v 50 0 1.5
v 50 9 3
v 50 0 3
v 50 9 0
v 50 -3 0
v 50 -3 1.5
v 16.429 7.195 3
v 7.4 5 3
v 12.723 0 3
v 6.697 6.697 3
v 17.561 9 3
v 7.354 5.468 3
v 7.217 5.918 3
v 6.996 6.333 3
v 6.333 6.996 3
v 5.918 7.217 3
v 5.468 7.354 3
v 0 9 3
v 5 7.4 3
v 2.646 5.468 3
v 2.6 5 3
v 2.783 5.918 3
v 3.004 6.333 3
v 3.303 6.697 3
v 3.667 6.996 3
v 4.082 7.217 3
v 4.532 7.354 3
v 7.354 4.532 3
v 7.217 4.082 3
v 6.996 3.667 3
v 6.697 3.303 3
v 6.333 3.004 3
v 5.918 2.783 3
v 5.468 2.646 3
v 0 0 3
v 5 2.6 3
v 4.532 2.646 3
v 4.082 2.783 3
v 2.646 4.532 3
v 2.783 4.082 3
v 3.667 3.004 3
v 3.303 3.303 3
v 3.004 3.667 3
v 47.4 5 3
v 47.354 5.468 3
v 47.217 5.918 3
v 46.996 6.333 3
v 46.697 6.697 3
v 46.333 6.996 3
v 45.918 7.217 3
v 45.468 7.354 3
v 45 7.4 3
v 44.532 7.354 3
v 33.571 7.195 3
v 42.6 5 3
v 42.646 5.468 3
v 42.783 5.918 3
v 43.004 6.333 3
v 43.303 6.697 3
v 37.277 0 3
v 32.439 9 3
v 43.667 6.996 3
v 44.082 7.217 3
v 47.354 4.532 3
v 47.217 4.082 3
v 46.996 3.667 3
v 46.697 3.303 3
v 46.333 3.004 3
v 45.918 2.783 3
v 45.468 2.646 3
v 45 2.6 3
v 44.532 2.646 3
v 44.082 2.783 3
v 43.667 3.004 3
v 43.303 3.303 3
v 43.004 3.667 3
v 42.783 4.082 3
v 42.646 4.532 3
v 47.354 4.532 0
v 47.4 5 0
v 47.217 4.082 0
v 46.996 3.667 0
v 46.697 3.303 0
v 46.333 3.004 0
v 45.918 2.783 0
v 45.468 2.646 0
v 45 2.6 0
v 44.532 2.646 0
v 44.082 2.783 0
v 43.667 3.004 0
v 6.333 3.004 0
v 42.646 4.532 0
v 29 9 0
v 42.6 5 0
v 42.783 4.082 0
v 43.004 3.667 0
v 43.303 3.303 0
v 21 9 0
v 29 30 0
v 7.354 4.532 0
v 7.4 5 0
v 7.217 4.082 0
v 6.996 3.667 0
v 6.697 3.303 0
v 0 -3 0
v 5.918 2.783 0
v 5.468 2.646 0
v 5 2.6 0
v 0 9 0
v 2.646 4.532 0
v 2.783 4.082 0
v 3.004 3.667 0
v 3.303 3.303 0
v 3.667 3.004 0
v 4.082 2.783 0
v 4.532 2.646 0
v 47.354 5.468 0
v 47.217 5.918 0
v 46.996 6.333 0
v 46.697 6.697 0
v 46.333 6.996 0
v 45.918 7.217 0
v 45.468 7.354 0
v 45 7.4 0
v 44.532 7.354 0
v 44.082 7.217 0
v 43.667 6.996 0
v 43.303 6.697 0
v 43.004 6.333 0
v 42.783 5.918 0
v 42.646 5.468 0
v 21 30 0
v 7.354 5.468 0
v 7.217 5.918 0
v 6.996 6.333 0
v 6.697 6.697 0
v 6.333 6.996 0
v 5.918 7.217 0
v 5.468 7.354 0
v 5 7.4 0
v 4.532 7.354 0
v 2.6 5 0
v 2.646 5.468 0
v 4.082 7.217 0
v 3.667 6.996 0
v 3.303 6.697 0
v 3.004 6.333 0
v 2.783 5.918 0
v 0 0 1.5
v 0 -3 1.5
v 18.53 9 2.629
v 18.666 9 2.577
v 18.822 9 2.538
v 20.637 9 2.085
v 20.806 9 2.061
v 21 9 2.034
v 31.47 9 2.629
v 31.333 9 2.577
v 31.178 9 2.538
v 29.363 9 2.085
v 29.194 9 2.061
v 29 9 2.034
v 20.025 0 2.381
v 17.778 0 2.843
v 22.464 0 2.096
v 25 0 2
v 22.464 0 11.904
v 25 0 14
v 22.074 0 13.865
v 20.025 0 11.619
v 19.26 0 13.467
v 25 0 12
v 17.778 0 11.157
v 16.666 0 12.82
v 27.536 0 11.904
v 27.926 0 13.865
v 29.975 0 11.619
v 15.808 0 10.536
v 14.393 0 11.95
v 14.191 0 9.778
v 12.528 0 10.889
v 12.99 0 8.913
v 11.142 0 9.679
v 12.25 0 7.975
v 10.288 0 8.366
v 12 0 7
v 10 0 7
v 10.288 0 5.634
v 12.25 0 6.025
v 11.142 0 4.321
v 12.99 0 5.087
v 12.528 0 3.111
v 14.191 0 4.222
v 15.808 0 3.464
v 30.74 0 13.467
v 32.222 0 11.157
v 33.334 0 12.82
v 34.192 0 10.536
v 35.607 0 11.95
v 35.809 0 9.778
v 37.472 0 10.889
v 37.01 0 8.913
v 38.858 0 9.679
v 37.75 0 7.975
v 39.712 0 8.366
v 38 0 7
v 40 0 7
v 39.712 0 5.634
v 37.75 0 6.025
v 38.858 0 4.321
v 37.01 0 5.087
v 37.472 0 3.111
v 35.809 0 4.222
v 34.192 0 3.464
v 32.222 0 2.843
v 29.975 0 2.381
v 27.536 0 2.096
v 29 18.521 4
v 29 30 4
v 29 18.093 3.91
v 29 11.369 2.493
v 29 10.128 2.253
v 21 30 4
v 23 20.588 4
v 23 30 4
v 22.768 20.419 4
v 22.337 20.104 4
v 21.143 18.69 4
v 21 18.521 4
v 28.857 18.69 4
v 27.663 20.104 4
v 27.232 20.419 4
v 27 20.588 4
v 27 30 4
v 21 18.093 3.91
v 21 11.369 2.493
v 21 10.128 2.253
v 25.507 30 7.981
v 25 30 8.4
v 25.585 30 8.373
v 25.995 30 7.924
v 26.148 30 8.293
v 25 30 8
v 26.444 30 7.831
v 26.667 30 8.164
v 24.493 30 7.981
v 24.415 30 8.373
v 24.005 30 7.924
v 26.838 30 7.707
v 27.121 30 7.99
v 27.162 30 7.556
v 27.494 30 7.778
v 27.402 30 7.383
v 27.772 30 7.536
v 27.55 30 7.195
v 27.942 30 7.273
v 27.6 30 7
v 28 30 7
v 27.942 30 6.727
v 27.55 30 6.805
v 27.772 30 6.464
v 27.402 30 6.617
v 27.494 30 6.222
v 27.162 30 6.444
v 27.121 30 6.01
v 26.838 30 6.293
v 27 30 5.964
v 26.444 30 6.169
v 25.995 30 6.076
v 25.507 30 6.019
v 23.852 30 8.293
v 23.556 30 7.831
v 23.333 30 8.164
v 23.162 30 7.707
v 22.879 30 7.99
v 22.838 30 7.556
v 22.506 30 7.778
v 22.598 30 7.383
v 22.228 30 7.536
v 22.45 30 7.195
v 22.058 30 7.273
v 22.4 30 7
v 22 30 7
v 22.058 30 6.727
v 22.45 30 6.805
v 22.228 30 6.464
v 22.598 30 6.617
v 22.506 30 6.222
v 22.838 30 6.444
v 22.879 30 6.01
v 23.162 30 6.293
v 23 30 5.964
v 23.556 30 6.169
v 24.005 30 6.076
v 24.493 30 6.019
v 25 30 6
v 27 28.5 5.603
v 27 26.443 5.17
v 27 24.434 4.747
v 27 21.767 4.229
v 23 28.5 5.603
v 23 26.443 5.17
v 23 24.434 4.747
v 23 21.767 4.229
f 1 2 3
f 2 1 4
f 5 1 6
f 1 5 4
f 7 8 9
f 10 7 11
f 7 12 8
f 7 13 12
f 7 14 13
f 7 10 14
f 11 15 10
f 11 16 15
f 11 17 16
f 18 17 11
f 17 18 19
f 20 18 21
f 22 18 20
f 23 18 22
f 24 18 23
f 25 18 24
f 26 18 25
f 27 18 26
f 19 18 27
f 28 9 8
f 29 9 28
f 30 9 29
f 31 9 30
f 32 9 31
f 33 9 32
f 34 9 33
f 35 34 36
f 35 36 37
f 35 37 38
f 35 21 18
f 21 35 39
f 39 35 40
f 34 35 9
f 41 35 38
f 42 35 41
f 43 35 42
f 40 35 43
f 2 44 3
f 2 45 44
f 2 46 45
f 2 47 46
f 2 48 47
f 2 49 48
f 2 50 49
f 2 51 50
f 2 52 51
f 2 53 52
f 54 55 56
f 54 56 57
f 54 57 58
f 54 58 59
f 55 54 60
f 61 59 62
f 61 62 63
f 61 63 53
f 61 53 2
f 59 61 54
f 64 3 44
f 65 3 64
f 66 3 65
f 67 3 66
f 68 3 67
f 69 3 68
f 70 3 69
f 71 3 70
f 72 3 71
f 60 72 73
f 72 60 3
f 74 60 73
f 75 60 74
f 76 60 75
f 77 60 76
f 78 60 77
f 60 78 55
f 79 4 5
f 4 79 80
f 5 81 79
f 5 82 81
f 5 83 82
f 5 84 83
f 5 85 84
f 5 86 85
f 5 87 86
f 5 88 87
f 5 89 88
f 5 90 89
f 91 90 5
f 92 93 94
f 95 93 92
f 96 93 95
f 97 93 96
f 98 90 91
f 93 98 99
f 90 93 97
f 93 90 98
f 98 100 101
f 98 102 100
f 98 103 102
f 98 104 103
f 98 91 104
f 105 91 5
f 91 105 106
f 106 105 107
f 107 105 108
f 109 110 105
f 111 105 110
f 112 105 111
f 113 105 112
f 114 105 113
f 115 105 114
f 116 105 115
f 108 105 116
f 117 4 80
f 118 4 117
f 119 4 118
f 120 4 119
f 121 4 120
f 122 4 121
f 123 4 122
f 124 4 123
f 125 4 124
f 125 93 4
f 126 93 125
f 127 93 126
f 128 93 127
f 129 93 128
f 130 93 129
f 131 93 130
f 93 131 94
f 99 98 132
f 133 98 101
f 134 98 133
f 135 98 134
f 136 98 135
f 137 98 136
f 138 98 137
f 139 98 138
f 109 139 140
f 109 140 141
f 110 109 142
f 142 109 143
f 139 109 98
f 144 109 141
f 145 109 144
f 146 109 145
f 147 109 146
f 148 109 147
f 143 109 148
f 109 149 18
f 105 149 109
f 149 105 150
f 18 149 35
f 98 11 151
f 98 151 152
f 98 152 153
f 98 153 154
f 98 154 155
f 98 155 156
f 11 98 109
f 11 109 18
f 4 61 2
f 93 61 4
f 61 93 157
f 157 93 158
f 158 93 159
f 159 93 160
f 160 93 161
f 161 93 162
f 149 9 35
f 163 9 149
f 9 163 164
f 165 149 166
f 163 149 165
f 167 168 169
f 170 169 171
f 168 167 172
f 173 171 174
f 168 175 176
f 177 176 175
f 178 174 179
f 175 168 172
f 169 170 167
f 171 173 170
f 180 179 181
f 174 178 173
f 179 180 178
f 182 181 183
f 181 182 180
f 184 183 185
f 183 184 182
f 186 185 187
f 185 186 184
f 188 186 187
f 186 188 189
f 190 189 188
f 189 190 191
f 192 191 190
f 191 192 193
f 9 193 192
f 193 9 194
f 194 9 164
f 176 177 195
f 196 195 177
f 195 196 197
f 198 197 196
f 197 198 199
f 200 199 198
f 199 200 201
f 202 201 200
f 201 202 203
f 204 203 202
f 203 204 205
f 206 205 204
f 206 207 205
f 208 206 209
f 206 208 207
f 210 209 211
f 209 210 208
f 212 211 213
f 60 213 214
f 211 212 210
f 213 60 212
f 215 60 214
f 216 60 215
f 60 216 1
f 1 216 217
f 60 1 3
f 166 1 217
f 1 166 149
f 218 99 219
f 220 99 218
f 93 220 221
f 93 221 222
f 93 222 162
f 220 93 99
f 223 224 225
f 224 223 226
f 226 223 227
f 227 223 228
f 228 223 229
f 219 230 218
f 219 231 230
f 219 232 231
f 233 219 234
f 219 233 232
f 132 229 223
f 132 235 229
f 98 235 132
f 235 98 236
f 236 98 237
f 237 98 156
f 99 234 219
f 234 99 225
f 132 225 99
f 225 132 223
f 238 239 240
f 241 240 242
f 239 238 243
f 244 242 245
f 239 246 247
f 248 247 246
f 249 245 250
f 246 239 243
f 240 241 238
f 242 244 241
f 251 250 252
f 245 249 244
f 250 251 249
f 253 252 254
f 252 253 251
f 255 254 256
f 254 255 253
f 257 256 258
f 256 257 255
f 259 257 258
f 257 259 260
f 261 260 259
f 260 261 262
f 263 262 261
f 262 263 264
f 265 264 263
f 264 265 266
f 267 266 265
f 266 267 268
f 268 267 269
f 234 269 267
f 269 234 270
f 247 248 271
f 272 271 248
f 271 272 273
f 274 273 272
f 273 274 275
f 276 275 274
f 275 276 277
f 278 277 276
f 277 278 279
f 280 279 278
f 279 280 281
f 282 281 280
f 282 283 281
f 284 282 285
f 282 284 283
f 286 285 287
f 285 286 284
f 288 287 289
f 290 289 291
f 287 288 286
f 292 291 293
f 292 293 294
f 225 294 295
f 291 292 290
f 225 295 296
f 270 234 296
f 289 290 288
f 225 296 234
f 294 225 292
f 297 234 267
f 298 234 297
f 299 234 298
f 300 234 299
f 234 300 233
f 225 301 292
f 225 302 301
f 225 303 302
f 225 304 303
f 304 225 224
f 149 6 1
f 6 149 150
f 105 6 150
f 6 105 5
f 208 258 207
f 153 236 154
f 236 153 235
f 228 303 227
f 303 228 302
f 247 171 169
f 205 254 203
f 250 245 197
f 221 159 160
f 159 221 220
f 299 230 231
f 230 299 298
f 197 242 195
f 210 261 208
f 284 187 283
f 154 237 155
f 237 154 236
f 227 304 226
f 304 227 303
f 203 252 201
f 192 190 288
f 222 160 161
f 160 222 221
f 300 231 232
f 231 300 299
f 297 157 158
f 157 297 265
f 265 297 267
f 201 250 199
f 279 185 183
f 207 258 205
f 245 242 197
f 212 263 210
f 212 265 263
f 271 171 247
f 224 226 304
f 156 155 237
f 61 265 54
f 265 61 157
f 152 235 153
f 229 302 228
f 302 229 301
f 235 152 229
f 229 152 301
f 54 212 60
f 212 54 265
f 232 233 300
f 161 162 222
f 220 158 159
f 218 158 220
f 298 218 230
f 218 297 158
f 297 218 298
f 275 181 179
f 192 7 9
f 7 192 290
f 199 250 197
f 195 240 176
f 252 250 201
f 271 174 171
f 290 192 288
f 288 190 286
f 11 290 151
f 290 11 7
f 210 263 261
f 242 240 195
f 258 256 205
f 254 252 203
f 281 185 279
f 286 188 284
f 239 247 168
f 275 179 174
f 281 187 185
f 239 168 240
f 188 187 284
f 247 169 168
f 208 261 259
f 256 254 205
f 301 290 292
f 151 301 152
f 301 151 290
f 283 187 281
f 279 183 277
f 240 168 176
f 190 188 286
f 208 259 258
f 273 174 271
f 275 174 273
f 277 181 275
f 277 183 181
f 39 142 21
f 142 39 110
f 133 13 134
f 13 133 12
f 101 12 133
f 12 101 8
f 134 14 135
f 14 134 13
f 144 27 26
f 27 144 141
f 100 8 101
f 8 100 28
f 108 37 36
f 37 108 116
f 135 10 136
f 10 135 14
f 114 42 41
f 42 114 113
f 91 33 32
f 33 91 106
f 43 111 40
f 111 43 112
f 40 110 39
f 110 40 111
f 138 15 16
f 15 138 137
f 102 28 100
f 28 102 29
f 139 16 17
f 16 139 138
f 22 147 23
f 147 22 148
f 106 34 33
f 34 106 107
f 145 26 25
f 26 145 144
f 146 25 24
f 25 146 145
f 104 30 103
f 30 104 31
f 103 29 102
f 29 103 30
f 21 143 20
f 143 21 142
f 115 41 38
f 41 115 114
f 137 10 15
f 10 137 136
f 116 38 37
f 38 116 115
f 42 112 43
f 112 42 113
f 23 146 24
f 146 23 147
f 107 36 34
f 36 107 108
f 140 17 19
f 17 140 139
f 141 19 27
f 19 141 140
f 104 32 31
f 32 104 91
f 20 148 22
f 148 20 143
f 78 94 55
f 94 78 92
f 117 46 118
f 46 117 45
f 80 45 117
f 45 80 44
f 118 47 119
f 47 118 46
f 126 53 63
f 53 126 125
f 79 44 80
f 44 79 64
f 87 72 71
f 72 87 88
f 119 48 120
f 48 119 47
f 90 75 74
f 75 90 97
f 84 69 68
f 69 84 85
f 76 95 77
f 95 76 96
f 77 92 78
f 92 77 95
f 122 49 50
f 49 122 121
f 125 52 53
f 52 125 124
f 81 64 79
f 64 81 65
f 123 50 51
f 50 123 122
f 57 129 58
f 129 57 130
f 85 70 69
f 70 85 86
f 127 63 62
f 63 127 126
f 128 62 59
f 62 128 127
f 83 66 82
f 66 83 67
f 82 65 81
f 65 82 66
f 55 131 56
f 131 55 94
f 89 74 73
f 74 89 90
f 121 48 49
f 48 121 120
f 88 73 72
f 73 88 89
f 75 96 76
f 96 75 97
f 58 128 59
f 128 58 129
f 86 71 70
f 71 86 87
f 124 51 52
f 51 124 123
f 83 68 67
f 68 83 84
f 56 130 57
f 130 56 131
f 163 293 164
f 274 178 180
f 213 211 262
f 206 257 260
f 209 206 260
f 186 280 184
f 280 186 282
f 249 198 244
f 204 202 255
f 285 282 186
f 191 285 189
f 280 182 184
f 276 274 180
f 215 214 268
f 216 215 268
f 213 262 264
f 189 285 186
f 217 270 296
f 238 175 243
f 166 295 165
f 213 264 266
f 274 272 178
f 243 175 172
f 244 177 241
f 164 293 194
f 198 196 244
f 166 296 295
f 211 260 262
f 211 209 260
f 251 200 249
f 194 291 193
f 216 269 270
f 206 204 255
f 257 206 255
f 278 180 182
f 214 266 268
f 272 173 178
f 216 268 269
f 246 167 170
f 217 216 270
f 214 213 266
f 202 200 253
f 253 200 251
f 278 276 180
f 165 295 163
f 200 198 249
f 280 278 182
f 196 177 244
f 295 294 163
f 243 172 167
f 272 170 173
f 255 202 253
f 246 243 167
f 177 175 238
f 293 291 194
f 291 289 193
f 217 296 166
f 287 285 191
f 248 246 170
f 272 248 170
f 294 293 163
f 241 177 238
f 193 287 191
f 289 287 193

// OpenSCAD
// wire feeder back part for trans wingding machine
$fn = 32;

x_m  = 50.0;
y_m  = 30.0;
x_c  = x_m / 2;
y_1a =  9.0;
y_1b =  3.0;

z_1  =  3.0;
r_1x = 30.0;
r_1y =  5.0;

r_mh = 4.2 / 2 + 0.3; // mounting hole


difference() {
  union() {
    cube( [x_m,y_1a,z_1] );
    translate([x_c-4,1.0,0.0] )cube( [8.0,y_m-1,4] );
    translate([x_c-2,1.0,0.0] )cube( [4.0,y_m-1,8] );
    translate([0,-y_1b,0.0] )cube( [x_m,y_1b,z_1/2] );
    translate([x_c,0,7.0] ) rotate([-90,0,0])
      resize([30,14,30]) cylinder( r1=r_1x, r2=6.0, h=y_m );
  }
 
  translate( [    5.0,5.0,0.0]) cylinder( r=r_mh, h=z_1 );
  translate( [x_m-5.0,5.0,0.0]) cylinder( r=r_mh, h=z_1 );
   translate([x_c,0,7.0] ) rotate([-90,0,0])
      resize([26,10,30]) cylinder( r1=r_1x, r2=6.0, h=y_m );
  
}
